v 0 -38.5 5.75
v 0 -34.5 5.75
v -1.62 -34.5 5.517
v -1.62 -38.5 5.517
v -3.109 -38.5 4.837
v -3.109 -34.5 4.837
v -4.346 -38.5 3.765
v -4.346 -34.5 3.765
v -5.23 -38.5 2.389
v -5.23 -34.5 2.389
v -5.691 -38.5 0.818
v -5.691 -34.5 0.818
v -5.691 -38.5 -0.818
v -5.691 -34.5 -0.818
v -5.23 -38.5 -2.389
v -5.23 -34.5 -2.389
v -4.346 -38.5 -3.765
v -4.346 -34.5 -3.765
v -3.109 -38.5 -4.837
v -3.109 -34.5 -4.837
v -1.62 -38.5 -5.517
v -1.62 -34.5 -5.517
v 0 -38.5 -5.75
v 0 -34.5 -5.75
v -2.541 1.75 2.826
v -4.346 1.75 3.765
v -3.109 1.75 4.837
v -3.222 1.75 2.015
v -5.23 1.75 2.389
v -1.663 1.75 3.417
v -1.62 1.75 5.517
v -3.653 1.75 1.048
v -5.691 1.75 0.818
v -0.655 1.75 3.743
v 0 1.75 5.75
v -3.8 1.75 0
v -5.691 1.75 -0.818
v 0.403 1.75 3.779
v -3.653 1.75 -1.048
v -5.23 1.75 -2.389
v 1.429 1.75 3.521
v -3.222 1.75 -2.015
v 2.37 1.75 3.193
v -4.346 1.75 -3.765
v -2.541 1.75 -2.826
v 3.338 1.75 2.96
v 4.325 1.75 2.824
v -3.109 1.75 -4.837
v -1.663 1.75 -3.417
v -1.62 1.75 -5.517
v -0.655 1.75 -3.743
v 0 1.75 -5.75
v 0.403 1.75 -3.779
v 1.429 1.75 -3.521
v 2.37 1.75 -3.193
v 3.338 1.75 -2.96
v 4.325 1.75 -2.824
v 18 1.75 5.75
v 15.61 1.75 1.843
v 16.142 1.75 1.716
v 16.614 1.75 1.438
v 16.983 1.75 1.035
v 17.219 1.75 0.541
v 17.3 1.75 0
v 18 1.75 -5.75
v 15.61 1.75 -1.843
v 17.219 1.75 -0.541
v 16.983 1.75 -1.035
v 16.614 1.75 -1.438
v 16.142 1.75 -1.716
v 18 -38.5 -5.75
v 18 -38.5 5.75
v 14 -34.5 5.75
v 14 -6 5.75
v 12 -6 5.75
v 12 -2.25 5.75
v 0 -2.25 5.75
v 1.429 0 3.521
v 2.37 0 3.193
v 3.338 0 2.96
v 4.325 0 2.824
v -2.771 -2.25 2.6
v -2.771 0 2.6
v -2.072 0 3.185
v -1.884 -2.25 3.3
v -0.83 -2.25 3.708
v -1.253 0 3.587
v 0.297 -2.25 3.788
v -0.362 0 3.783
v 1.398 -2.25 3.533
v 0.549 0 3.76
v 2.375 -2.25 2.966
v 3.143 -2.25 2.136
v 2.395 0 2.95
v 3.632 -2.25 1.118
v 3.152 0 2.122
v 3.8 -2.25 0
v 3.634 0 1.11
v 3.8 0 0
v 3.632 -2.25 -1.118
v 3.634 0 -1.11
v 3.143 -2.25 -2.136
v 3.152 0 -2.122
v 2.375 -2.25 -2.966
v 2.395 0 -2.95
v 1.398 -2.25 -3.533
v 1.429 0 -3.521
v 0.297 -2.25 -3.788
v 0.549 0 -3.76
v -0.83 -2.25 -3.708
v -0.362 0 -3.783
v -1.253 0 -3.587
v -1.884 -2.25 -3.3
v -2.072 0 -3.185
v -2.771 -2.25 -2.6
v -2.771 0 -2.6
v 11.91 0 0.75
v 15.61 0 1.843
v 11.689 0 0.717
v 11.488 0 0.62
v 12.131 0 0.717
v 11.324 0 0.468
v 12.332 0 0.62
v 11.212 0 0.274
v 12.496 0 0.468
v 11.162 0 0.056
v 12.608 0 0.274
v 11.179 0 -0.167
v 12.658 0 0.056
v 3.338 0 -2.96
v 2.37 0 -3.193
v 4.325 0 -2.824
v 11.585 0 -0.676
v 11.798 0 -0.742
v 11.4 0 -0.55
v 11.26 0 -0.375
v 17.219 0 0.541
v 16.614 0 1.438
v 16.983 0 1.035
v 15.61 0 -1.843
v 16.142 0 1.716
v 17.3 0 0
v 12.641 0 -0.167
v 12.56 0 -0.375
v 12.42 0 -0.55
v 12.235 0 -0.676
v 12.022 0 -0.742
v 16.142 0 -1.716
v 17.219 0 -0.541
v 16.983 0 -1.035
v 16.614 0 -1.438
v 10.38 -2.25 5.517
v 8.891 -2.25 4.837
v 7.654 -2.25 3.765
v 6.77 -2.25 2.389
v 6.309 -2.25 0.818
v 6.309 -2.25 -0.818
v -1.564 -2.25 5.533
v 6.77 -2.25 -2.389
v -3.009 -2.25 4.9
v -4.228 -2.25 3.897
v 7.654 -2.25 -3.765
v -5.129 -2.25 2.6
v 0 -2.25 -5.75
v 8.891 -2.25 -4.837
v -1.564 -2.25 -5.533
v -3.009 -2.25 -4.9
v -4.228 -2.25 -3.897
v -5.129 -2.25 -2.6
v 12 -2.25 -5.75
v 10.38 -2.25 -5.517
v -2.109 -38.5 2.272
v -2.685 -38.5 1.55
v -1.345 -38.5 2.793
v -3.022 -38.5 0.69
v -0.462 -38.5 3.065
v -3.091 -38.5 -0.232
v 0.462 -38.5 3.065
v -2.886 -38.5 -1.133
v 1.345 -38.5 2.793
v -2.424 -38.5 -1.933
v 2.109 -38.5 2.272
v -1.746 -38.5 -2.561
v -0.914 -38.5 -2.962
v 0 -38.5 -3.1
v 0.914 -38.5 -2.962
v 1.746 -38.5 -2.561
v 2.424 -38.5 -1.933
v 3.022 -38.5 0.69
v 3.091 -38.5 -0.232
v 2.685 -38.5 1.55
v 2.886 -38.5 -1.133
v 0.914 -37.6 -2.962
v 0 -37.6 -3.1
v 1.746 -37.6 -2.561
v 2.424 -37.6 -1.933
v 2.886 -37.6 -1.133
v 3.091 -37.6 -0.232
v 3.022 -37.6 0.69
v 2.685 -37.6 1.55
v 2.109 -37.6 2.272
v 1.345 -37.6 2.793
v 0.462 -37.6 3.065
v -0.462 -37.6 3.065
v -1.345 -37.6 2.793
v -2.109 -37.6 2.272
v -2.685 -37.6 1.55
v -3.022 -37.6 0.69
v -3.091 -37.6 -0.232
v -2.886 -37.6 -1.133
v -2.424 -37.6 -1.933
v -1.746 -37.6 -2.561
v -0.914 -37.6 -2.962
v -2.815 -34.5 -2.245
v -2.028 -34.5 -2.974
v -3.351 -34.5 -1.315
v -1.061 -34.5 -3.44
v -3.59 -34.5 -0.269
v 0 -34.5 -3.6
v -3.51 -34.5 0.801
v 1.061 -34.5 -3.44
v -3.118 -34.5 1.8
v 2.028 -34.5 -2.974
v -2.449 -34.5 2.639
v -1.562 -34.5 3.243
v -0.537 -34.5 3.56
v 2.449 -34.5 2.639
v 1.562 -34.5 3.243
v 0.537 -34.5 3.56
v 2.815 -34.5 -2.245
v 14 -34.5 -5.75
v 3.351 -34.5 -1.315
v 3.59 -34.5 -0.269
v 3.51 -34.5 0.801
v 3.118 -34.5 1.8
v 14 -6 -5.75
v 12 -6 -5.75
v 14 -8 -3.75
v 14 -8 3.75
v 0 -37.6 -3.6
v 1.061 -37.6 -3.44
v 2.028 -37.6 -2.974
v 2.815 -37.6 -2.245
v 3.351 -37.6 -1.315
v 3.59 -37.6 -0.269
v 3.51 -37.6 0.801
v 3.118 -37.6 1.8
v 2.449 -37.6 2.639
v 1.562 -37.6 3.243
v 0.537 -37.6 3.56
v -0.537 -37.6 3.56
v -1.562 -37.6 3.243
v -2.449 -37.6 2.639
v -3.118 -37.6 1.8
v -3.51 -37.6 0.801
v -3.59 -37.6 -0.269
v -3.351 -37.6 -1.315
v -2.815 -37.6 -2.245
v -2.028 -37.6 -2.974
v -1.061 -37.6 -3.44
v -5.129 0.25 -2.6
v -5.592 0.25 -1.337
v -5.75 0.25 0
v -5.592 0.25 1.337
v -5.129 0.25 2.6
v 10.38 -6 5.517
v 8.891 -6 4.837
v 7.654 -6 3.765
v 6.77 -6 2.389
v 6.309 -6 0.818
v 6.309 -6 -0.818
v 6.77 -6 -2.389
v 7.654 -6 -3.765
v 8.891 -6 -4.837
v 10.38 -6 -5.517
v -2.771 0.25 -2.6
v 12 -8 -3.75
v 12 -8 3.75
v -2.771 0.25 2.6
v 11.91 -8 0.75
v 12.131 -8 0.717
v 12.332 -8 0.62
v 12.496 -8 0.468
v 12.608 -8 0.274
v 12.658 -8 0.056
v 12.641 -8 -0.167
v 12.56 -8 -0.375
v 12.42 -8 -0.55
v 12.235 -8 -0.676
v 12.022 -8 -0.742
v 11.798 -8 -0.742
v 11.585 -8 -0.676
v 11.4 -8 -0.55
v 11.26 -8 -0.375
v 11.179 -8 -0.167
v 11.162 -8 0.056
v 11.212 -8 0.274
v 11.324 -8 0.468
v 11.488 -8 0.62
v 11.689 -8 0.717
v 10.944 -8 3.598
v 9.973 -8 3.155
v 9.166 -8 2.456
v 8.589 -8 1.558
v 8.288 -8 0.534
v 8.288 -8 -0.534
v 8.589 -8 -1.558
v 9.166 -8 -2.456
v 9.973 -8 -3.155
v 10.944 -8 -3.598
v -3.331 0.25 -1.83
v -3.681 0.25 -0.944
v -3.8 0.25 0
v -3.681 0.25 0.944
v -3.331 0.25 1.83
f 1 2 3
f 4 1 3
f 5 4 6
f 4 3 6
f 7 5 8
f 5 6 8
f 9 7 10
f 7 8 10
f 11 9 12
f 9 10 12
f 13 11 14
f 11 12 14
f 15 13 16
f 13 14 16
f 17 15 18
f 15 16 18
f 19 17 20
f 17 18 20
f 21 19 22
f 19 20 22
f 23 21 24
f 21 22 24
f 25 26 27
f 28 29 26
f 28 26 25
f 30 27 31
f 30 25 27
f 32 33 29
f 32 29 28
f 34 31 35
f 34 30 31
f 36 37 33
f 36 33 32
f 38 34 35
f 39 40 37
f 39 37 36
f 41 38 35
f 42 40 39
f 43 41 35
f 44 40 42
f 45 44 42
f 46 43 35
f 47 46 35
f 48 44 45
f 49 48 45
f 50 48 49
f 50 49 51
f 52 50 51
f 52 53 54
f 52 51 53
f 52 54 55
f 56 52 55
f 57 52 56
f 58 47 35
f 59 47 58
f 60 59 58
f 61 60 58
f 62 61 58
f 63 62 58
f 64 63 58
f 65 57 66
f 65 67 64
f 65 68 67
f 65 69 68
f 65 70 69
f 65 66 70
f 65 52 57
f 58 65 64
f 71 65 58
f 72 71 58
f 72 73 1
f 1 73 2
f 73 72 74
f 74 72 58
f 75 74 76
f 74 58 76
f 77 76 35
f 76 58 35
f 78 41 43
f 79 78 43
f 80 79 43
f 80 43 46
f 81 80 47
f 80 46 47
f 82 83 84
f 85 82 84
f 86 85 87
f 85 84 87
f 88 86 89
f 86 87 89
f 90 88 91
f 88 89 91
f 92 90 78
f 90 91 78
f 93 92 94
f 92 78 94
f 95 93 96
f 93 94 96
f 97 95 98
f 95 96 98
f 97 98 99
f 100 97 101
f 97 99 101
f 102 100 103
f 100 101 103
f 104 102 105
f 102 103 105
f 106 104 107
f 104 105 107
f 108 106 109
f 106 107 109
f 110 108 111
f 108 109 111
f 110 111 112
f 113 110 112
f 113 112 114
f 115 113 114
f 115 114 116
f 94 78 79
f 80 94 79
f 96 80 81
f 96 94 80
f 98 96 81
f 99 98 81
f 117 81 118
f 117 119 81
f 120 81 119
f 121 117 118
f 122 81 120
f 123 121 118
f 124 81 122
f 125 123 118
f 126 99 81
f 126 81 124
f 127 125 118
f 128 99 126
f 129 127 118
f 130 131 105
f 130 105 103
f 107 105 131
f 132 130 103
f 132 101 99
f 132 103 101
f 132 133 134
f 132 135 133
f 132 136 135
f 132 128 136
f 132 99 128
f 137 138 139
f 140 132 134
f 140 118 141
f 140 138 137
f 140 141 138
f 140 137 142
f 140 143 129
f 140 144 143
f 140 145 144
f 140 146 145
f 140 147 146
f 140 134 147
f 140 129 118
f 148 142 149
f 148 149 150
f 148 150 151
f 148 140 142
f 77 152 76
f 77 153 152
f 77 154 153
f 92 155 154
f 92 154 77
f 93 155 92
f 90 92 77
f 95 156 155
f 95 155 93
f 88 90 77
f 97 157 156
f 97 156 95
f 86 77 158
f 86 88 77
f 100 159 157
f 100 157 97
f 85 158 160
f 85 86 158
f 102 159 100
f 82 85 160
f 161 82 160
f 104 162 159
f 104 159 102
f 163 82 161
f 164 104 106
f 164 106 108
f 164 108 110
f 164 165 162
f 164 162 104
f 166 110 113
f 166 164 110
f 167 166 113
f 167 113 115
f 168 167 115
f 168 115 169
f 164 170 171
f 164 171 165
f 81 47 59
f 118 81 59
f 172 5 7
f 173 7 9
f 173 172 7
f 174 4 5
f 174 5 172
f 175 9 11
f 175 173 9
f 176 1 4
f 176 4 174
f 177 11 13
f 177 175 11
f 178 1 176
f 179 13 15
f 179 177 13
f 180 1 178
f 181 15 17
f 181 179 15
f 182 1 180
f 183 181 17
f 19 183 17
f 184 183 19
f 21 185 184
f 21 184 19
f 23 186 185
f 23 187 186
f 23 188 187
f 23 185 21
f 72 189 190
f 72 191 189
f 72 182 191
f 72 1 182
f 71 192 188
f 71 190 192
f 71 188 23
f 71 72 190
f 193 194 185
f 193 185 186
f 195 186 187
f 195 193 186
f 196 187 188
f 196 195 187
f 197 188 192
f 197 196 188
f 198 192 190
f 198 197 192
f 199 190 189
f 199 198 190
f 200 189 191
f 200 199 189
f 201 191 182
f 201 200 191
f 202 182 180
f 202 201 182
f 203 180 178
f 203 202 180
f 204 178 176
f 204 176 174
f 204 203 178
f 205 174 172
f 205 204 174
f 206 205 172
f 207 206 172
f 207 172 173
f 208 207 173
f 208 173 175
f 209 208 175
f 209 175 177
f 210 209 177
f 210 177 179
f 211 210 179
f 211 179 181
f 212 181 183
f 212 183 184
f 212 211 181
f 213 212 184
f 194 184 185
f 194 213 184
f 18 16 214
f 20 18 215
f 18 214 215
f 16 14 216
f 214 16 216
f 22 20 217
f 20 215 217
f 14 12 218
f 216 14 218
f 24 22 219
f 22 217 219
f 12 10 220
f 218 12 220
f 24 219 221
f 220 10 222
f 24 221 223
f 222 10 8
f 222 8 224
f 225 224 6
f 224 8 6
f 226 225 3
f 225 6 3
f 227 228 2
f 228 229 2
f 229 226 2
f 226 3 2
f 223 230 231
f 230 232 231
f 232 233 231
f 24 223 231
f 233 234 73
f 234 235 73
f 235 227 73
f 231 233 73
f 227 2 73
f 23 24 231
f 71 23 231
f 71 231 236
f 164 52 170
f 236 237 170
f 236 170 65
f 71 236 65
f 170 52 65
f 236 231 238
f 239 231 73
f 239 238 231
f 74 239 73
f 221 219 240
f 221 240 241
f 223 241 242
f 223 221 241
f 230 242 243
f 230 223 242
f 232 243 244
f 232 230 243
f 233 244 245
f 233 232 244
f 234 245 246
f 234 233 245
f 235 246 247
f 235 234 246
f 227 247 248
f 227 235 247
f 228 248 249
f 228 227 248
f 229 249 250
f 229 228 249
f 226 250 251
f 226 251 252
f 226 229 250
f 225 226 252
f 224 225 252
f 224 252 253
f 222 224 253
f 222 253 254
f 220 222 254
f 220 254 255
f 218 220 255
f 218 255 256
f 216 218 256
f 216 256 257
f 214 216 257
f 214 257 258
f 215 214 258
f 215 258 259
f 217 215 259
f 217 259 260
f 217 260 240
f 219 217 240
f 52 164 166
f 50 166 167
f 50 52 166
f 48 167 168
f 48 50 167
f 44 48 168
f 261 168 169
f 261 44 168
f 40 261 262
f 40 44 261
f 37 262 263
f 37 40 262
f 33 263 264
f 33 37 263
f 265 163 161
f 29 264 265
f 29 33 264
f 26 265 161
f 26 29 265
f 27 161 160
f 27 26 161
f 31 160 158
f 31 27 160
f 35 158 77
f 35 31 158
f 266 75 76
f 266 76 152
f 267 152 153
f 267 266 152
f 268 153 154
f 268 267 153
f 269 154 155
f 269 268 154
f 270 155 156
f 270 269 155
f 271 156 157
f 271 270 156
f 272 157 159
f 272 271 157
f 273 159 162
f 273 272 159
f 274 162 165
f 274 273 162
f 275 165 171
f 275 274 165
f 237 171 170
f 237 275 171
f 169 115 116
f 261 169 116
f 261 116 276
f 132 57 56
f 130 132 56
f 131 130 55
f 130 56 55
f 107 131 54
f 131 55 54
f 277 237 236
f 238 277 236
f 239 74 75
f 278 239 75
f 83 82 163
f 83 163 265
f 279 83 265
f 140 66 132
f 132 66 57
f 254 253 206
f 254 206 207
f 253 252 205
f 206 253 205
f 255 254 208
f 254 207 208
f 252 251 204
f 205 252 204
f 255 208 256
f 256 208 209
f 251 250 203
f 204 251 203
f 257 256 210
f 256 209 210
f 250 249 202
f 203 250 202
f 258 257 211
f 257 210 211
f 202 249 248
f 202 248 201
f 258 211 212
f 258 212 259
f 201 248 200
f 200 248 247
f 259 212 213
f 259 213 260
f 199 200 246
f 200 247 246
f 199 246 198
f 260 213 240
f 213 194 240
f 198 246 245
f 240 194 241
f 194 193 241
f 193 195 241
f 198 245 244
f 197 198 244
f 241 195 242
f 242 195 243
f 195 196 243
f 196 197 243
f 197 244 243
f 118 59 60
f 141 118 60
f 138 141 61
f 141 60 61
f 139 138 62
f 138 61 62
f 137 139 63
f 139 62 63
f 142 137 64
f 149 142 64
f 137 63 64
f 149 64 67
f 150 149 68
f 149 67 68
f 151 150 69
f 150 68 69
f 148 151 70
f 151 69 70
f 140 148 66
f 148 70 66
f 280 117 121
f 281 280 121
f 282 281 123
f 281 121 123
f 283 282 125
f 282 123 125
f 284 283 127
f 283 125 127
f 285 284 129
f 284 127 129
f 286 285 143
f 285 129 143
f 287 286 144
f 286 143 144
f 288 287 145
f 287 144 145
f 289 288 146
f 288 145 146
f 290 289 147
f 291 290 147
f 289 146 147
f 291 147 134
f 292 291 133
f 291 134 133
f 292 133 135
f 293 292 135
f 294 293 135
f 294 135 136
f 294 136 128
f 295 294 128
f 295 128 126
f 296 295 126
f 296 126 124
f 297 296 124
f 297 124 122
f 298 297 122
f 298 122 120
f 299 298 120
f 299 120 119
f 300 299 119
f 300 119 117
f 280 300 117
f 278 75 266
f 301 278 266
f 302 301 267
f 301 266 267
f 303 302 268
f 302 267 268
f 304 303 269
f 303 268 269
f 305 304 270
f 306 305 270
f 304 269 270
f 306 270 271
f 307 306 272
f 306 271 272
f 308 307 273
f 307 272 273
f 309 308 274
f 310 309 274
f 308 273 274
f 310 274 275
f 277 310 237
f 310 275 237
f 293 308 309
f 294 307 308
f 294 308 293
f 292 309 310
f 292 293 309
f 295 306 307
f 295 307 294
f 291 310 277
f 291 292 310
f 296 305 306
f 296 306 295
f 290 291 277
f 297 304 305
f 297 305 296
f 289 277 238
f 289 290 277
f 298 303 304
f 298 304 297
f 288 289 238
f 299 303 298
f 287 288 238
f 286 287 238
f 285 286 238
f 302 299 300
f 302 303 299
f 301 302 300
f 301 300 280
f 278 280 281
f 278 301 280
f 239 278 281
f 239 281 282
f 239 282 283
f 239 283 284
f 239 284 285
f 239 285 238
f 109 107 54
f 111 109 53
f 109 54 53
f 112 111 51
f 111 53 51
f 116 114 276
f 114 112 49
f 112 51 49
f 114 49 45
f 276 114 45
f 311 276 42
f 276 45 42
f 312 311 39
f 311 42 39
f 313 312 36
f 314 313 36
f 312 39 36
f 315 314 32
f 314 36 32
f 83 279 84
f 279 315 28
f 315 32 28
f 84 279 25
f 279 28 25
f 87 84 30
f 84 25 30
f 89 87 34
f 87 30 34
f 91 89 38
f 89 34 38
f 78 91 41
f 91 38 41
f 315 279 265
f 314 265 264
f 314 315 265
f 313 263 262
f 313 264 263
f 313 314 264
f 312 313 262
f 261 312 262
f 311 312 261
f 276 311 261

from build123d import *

# Parameters (mm, degrees)
SKETCH1_R                = 5.75
SKETCH1_R_2              = 3.8
BOSS_EXTRUDE1_DEPTH      = 2.25
BOSS_EXTRUDE2_DEPTH      = 2.25
SKETCH3_W                = 11.75
SKETCH3_H                = 11.5
BOSS_EXTRUDE3_DEPTH      = 5.75
BOSS_EXTRUDE4_START      = 1.75
BOSS_EXTRUDE4_DEPTH      = 1.75
FILLET3_R                = 10
SKETCH6_W                = 5.2
SKETCH6_H                = 2.5
CUT_EXTRUDE1_DEPTH       = 21.519807504
SKETCH7_R                = 0.75
CUT_EXTRUDE2_DEPTH       = 21.519807504
FILLET1_RADIUS           = 5.75
FILLET1_LENGTH           = 5.75
BOSS_EXTRUDE5_DEPTH      = 26.5
BOSS_EXTRUDE5_DEPTH_BACK = 4
SKETCH5_W                = 4
SKETCH5_H                = 11.5
CHAMFER1_SIZE            = 2
SKETCH8_R                = 3.6
BOSS_EXTRUDE6_DEPTH      = 4
BOSS_EXTRUDE7_START      = -0.9
SKETCH9_R                = 3.6
SKETCH9_R_2              = 3.1
BOSS_EXTRUDE7_DEPTH      = 0.9


with BuildPart() as part:
    # Sketch1 → Boss-Extrude1 (new body)
    with BuildSketch(Plane(origin=(0, 0, 0), x_dir=(1, 0, 0), z_dir=(0, 1, 0))):
        with Locations(Location((0, 0, 0), (0, 0, 270))):
            Circle(SKETCH1_R)
        with Locations(Location((0, 0, 0), (0, 0, 270))):
            Circle(SKETCH1_R_2, mode=Mode.SUBTRACT)
    extrude(amount=-BOSS_EXTRUDE1_DEPTH)

    # Sketch2 → Boss-Extrude2 (add)
    with BuildSketch(Plane(origin=(0, 0, 0), x_dir=(1, 0, 0), z_dir=(0, 1, 0))):
        with BuildLine():
            Line((0, 5.75), (18, 5.75))
            Line((18, 5.75), (18, -5.75))
            Line((18, -5.75), (0, -5.75))
            ThreePointArc((0, -5.75), (5.75, 0), (0, 5.75))
        make_face()
    extrude(amount=-BOSS_EXTRUDE2_DEPTH)

    # Sketch3 → Boss-Extrude3 (add)
    with BuildSketch(Plane.XZ.offset(2.25)):
        with Locations((12.125, 0)):
            Rectangle(SKETCH3_W, SKETCH3_H)
    extrude(amount=BOSS_EXTRUDE3_DEPTH)

    # Sketch4 → Boss-Extrude4 (add)
    with BuildSketch(Plane(origin=(0, 0, 0), x_dir=(1, 0, 0), z_dir=(0, 1, 0)).offset(BOSS_EXTRUDE4_START)):
        with BuildLine():
            Line((0, -5.75), (18, -5.75))
            Line((18, -5.75), (18, 5.75))
            Line((18, 5.75), (0, 5.75))
            ThreePointArc((0, 5.75), (-5.75, 0), (0, -5.75))
        make_face()
        with BuildLine():
            Line((2.336179457, -2.9970428), (15.610227504, -1.84304833))
            ThreePointArc((15.610227504, -1.84304833), (17.3, 0), (15.610227504, 1.84304833))
            Line((15.610227504, 1.84304833), (2.336179457, 2.9970428))
            ThreePointArc((2.336179457, 2.9970428), (-3.8, 0), (2.336179457, -2.9970428))
        make_face(mode=Mode.SUBTRACT)
    extrude(amount=-BOSS_EXTRUDE4_DEPTH)

    # Fillet3
    # the kernel refuses this fillet: 10 mm, written as the material it takes off along each edge
    with BuildSketch(Plane(origin=(2.336179457, 6.739658122, 2.9970428), x_dir=(-0.8658918638658896, 0, 0.5002312266251037), z_dir=(0, -1, 0))) as fillet3_piece_1:
        with BuildLine():
            CenterArc((2.425392956, -9.90459182), FILLET3_R, 97.920932923, 17.12578451)
            Line((-1.808178045, -0.844962877), (0, 0))
            ThreePointArc((0, 0), (0.523664388, -0.036255108), (1.047328776, 0))
        make_face()
    extrude(amount=6.739658122, mode=Mode.SUBTRACT)
    with BuildSketch(Plane(origin=(2.336179457, 6.739658122, -2.9970428), x_dir=(-0.8658918638659203, 0, -0.5002312266250502), z_dir=(0, -1, 0))) as fillet3_piece_2:
        with BuildLine():
            CenterArc((2.425392956, 9.90459182), FILLET3_R, 244.953282566, 17.12578451)
            Line((-1.808178045, 0.844962877), (0, 0))
            ThreePointArc((0, 0), (0.523664388, 0.036255108), (1.047328776, 0))
        make_face()
    extrude(amount=6.739658122, mode=Mode.SUBTRACT)

    # Sketch6 → Cut-Extrude1 (cut, through all)
    with BuildSketch(Plane(origin=(0, 0, 0), x_dir=(0, 0, -1), z_dir=(1, 0, 0))):
        with Locations((0, -1)):
            Rectangle(SKETCH6_W, SKETCH6_H)
    extrude(amount=-CUT_EXTRUDE1_DEPTH, mode=Mode.SUBTRACT)

    # Sketch7 → Cut-Extrude2 (cut, through all)
    with BuildSketch(Plane(origin=(0, 0, 0), x_dir=(1, 0, 0), z_dir=(0, 1, 0))):
        with Locations(Location((11.91, 0, 0), (0, 0, 270))):
            Circle(SKETCH7_R)
    extrude(amount=-CUT_EXTRUDE2_DEPTH, mode=Mode.SUBTRACT)

    # Fillet1: full round fillet: the end face becomes a half cylinder, R = half its width
    fillet1_face = Plane((6.25, -5.125, 0), x_dir=(0, -1, 0), z_dir=(-1, 0, 0))  # on the end face: x along it, z out of the body
    fillet1_slab = fillet1_face.offset(-FILLET1_RADIUS / 2) * Box(FILLET1_LENGTH, 2 * FILLET1_RADIUS, FILLET1_RADIUS, mode=Mode.PRIVATE)  # the body's end, R deep
    fillet1_round = Plane((12, -5.125, 0), x_dir=(-1, 0, 0), z_dir=(0, -1, 0)) * Cylinder(FILLET1_RADIUS, FILLET1_LENGTH, mode=Mode.PRIVATE)  # its axis R under the face
    add(fillet1_slab - fillet1_round, mode=Mode.SUBTRACT)

    # Sketch5 → Boss-Extrude5 (add, two sides: drawn at the far end of the back side and taken through both)
    with BuildSketch(Plane.XZ.offset(8).offset(-BOSS_EXTRUDE5_DEPTH_BACK)):
        with Locations((16, 0)):
            Rectangle(SKETCH5_W, SKETCH5_H)
    extrude(amount=BOSS_EXTRUDE5_DEPTH + BOSS_EXTRUDE5_DEPTH_BACK)

    # Chamfer1
    chamfer1_edges = [part.edges().sort_by_distance(p)[0] for p in [
        (6.25, -8, 0),
        (13, -8, 5.75),
        (13, -8, -5.75),
    ]]
    chamfer(chamfer1_edges, length=CHAMFER1_SIZE)

    # Sketch8 → Boss-Extrude6 (add)
    with BuildSketch(Plane.XZ.offset(34.5)):
        with BuildLine():
            Line((18, 5.75), (0, 5.75))
            ThreePointArc((0, 5.75), (-5.75, 0), (0, -5.75))
            Line((0, -5.75), (18, -5.75))
            Line((18, -5.75), (18, 5.75))
        make_face()
        with Locations(Location((0, 0, 0), (0, 0, 270))):
            Circle(SKETCH8_R, mode=Mode.SUBTRACT)
    extrude(amount=BOSS_EXTRUDE6_DEPTH)

    # Sketch9 → Boss-Extrude7 (add)
    with BuildSketch(Plane.XZ.offset(38.5).offset(BOSS_EXTRUDE7_START)):
        with Locations(Location((0, 0, 0), (0, 0, 270))):
            Circle(SKETCH9_R)
        with Locations(Location((0, 0, 0), (0, 0, 270))):
            Circle(SKETCH9_R_2, mode=Mode.SUBTRACT)
    extrude(amount=BOSS_EXTRUDE7_DEPTH)


solid = part.part
